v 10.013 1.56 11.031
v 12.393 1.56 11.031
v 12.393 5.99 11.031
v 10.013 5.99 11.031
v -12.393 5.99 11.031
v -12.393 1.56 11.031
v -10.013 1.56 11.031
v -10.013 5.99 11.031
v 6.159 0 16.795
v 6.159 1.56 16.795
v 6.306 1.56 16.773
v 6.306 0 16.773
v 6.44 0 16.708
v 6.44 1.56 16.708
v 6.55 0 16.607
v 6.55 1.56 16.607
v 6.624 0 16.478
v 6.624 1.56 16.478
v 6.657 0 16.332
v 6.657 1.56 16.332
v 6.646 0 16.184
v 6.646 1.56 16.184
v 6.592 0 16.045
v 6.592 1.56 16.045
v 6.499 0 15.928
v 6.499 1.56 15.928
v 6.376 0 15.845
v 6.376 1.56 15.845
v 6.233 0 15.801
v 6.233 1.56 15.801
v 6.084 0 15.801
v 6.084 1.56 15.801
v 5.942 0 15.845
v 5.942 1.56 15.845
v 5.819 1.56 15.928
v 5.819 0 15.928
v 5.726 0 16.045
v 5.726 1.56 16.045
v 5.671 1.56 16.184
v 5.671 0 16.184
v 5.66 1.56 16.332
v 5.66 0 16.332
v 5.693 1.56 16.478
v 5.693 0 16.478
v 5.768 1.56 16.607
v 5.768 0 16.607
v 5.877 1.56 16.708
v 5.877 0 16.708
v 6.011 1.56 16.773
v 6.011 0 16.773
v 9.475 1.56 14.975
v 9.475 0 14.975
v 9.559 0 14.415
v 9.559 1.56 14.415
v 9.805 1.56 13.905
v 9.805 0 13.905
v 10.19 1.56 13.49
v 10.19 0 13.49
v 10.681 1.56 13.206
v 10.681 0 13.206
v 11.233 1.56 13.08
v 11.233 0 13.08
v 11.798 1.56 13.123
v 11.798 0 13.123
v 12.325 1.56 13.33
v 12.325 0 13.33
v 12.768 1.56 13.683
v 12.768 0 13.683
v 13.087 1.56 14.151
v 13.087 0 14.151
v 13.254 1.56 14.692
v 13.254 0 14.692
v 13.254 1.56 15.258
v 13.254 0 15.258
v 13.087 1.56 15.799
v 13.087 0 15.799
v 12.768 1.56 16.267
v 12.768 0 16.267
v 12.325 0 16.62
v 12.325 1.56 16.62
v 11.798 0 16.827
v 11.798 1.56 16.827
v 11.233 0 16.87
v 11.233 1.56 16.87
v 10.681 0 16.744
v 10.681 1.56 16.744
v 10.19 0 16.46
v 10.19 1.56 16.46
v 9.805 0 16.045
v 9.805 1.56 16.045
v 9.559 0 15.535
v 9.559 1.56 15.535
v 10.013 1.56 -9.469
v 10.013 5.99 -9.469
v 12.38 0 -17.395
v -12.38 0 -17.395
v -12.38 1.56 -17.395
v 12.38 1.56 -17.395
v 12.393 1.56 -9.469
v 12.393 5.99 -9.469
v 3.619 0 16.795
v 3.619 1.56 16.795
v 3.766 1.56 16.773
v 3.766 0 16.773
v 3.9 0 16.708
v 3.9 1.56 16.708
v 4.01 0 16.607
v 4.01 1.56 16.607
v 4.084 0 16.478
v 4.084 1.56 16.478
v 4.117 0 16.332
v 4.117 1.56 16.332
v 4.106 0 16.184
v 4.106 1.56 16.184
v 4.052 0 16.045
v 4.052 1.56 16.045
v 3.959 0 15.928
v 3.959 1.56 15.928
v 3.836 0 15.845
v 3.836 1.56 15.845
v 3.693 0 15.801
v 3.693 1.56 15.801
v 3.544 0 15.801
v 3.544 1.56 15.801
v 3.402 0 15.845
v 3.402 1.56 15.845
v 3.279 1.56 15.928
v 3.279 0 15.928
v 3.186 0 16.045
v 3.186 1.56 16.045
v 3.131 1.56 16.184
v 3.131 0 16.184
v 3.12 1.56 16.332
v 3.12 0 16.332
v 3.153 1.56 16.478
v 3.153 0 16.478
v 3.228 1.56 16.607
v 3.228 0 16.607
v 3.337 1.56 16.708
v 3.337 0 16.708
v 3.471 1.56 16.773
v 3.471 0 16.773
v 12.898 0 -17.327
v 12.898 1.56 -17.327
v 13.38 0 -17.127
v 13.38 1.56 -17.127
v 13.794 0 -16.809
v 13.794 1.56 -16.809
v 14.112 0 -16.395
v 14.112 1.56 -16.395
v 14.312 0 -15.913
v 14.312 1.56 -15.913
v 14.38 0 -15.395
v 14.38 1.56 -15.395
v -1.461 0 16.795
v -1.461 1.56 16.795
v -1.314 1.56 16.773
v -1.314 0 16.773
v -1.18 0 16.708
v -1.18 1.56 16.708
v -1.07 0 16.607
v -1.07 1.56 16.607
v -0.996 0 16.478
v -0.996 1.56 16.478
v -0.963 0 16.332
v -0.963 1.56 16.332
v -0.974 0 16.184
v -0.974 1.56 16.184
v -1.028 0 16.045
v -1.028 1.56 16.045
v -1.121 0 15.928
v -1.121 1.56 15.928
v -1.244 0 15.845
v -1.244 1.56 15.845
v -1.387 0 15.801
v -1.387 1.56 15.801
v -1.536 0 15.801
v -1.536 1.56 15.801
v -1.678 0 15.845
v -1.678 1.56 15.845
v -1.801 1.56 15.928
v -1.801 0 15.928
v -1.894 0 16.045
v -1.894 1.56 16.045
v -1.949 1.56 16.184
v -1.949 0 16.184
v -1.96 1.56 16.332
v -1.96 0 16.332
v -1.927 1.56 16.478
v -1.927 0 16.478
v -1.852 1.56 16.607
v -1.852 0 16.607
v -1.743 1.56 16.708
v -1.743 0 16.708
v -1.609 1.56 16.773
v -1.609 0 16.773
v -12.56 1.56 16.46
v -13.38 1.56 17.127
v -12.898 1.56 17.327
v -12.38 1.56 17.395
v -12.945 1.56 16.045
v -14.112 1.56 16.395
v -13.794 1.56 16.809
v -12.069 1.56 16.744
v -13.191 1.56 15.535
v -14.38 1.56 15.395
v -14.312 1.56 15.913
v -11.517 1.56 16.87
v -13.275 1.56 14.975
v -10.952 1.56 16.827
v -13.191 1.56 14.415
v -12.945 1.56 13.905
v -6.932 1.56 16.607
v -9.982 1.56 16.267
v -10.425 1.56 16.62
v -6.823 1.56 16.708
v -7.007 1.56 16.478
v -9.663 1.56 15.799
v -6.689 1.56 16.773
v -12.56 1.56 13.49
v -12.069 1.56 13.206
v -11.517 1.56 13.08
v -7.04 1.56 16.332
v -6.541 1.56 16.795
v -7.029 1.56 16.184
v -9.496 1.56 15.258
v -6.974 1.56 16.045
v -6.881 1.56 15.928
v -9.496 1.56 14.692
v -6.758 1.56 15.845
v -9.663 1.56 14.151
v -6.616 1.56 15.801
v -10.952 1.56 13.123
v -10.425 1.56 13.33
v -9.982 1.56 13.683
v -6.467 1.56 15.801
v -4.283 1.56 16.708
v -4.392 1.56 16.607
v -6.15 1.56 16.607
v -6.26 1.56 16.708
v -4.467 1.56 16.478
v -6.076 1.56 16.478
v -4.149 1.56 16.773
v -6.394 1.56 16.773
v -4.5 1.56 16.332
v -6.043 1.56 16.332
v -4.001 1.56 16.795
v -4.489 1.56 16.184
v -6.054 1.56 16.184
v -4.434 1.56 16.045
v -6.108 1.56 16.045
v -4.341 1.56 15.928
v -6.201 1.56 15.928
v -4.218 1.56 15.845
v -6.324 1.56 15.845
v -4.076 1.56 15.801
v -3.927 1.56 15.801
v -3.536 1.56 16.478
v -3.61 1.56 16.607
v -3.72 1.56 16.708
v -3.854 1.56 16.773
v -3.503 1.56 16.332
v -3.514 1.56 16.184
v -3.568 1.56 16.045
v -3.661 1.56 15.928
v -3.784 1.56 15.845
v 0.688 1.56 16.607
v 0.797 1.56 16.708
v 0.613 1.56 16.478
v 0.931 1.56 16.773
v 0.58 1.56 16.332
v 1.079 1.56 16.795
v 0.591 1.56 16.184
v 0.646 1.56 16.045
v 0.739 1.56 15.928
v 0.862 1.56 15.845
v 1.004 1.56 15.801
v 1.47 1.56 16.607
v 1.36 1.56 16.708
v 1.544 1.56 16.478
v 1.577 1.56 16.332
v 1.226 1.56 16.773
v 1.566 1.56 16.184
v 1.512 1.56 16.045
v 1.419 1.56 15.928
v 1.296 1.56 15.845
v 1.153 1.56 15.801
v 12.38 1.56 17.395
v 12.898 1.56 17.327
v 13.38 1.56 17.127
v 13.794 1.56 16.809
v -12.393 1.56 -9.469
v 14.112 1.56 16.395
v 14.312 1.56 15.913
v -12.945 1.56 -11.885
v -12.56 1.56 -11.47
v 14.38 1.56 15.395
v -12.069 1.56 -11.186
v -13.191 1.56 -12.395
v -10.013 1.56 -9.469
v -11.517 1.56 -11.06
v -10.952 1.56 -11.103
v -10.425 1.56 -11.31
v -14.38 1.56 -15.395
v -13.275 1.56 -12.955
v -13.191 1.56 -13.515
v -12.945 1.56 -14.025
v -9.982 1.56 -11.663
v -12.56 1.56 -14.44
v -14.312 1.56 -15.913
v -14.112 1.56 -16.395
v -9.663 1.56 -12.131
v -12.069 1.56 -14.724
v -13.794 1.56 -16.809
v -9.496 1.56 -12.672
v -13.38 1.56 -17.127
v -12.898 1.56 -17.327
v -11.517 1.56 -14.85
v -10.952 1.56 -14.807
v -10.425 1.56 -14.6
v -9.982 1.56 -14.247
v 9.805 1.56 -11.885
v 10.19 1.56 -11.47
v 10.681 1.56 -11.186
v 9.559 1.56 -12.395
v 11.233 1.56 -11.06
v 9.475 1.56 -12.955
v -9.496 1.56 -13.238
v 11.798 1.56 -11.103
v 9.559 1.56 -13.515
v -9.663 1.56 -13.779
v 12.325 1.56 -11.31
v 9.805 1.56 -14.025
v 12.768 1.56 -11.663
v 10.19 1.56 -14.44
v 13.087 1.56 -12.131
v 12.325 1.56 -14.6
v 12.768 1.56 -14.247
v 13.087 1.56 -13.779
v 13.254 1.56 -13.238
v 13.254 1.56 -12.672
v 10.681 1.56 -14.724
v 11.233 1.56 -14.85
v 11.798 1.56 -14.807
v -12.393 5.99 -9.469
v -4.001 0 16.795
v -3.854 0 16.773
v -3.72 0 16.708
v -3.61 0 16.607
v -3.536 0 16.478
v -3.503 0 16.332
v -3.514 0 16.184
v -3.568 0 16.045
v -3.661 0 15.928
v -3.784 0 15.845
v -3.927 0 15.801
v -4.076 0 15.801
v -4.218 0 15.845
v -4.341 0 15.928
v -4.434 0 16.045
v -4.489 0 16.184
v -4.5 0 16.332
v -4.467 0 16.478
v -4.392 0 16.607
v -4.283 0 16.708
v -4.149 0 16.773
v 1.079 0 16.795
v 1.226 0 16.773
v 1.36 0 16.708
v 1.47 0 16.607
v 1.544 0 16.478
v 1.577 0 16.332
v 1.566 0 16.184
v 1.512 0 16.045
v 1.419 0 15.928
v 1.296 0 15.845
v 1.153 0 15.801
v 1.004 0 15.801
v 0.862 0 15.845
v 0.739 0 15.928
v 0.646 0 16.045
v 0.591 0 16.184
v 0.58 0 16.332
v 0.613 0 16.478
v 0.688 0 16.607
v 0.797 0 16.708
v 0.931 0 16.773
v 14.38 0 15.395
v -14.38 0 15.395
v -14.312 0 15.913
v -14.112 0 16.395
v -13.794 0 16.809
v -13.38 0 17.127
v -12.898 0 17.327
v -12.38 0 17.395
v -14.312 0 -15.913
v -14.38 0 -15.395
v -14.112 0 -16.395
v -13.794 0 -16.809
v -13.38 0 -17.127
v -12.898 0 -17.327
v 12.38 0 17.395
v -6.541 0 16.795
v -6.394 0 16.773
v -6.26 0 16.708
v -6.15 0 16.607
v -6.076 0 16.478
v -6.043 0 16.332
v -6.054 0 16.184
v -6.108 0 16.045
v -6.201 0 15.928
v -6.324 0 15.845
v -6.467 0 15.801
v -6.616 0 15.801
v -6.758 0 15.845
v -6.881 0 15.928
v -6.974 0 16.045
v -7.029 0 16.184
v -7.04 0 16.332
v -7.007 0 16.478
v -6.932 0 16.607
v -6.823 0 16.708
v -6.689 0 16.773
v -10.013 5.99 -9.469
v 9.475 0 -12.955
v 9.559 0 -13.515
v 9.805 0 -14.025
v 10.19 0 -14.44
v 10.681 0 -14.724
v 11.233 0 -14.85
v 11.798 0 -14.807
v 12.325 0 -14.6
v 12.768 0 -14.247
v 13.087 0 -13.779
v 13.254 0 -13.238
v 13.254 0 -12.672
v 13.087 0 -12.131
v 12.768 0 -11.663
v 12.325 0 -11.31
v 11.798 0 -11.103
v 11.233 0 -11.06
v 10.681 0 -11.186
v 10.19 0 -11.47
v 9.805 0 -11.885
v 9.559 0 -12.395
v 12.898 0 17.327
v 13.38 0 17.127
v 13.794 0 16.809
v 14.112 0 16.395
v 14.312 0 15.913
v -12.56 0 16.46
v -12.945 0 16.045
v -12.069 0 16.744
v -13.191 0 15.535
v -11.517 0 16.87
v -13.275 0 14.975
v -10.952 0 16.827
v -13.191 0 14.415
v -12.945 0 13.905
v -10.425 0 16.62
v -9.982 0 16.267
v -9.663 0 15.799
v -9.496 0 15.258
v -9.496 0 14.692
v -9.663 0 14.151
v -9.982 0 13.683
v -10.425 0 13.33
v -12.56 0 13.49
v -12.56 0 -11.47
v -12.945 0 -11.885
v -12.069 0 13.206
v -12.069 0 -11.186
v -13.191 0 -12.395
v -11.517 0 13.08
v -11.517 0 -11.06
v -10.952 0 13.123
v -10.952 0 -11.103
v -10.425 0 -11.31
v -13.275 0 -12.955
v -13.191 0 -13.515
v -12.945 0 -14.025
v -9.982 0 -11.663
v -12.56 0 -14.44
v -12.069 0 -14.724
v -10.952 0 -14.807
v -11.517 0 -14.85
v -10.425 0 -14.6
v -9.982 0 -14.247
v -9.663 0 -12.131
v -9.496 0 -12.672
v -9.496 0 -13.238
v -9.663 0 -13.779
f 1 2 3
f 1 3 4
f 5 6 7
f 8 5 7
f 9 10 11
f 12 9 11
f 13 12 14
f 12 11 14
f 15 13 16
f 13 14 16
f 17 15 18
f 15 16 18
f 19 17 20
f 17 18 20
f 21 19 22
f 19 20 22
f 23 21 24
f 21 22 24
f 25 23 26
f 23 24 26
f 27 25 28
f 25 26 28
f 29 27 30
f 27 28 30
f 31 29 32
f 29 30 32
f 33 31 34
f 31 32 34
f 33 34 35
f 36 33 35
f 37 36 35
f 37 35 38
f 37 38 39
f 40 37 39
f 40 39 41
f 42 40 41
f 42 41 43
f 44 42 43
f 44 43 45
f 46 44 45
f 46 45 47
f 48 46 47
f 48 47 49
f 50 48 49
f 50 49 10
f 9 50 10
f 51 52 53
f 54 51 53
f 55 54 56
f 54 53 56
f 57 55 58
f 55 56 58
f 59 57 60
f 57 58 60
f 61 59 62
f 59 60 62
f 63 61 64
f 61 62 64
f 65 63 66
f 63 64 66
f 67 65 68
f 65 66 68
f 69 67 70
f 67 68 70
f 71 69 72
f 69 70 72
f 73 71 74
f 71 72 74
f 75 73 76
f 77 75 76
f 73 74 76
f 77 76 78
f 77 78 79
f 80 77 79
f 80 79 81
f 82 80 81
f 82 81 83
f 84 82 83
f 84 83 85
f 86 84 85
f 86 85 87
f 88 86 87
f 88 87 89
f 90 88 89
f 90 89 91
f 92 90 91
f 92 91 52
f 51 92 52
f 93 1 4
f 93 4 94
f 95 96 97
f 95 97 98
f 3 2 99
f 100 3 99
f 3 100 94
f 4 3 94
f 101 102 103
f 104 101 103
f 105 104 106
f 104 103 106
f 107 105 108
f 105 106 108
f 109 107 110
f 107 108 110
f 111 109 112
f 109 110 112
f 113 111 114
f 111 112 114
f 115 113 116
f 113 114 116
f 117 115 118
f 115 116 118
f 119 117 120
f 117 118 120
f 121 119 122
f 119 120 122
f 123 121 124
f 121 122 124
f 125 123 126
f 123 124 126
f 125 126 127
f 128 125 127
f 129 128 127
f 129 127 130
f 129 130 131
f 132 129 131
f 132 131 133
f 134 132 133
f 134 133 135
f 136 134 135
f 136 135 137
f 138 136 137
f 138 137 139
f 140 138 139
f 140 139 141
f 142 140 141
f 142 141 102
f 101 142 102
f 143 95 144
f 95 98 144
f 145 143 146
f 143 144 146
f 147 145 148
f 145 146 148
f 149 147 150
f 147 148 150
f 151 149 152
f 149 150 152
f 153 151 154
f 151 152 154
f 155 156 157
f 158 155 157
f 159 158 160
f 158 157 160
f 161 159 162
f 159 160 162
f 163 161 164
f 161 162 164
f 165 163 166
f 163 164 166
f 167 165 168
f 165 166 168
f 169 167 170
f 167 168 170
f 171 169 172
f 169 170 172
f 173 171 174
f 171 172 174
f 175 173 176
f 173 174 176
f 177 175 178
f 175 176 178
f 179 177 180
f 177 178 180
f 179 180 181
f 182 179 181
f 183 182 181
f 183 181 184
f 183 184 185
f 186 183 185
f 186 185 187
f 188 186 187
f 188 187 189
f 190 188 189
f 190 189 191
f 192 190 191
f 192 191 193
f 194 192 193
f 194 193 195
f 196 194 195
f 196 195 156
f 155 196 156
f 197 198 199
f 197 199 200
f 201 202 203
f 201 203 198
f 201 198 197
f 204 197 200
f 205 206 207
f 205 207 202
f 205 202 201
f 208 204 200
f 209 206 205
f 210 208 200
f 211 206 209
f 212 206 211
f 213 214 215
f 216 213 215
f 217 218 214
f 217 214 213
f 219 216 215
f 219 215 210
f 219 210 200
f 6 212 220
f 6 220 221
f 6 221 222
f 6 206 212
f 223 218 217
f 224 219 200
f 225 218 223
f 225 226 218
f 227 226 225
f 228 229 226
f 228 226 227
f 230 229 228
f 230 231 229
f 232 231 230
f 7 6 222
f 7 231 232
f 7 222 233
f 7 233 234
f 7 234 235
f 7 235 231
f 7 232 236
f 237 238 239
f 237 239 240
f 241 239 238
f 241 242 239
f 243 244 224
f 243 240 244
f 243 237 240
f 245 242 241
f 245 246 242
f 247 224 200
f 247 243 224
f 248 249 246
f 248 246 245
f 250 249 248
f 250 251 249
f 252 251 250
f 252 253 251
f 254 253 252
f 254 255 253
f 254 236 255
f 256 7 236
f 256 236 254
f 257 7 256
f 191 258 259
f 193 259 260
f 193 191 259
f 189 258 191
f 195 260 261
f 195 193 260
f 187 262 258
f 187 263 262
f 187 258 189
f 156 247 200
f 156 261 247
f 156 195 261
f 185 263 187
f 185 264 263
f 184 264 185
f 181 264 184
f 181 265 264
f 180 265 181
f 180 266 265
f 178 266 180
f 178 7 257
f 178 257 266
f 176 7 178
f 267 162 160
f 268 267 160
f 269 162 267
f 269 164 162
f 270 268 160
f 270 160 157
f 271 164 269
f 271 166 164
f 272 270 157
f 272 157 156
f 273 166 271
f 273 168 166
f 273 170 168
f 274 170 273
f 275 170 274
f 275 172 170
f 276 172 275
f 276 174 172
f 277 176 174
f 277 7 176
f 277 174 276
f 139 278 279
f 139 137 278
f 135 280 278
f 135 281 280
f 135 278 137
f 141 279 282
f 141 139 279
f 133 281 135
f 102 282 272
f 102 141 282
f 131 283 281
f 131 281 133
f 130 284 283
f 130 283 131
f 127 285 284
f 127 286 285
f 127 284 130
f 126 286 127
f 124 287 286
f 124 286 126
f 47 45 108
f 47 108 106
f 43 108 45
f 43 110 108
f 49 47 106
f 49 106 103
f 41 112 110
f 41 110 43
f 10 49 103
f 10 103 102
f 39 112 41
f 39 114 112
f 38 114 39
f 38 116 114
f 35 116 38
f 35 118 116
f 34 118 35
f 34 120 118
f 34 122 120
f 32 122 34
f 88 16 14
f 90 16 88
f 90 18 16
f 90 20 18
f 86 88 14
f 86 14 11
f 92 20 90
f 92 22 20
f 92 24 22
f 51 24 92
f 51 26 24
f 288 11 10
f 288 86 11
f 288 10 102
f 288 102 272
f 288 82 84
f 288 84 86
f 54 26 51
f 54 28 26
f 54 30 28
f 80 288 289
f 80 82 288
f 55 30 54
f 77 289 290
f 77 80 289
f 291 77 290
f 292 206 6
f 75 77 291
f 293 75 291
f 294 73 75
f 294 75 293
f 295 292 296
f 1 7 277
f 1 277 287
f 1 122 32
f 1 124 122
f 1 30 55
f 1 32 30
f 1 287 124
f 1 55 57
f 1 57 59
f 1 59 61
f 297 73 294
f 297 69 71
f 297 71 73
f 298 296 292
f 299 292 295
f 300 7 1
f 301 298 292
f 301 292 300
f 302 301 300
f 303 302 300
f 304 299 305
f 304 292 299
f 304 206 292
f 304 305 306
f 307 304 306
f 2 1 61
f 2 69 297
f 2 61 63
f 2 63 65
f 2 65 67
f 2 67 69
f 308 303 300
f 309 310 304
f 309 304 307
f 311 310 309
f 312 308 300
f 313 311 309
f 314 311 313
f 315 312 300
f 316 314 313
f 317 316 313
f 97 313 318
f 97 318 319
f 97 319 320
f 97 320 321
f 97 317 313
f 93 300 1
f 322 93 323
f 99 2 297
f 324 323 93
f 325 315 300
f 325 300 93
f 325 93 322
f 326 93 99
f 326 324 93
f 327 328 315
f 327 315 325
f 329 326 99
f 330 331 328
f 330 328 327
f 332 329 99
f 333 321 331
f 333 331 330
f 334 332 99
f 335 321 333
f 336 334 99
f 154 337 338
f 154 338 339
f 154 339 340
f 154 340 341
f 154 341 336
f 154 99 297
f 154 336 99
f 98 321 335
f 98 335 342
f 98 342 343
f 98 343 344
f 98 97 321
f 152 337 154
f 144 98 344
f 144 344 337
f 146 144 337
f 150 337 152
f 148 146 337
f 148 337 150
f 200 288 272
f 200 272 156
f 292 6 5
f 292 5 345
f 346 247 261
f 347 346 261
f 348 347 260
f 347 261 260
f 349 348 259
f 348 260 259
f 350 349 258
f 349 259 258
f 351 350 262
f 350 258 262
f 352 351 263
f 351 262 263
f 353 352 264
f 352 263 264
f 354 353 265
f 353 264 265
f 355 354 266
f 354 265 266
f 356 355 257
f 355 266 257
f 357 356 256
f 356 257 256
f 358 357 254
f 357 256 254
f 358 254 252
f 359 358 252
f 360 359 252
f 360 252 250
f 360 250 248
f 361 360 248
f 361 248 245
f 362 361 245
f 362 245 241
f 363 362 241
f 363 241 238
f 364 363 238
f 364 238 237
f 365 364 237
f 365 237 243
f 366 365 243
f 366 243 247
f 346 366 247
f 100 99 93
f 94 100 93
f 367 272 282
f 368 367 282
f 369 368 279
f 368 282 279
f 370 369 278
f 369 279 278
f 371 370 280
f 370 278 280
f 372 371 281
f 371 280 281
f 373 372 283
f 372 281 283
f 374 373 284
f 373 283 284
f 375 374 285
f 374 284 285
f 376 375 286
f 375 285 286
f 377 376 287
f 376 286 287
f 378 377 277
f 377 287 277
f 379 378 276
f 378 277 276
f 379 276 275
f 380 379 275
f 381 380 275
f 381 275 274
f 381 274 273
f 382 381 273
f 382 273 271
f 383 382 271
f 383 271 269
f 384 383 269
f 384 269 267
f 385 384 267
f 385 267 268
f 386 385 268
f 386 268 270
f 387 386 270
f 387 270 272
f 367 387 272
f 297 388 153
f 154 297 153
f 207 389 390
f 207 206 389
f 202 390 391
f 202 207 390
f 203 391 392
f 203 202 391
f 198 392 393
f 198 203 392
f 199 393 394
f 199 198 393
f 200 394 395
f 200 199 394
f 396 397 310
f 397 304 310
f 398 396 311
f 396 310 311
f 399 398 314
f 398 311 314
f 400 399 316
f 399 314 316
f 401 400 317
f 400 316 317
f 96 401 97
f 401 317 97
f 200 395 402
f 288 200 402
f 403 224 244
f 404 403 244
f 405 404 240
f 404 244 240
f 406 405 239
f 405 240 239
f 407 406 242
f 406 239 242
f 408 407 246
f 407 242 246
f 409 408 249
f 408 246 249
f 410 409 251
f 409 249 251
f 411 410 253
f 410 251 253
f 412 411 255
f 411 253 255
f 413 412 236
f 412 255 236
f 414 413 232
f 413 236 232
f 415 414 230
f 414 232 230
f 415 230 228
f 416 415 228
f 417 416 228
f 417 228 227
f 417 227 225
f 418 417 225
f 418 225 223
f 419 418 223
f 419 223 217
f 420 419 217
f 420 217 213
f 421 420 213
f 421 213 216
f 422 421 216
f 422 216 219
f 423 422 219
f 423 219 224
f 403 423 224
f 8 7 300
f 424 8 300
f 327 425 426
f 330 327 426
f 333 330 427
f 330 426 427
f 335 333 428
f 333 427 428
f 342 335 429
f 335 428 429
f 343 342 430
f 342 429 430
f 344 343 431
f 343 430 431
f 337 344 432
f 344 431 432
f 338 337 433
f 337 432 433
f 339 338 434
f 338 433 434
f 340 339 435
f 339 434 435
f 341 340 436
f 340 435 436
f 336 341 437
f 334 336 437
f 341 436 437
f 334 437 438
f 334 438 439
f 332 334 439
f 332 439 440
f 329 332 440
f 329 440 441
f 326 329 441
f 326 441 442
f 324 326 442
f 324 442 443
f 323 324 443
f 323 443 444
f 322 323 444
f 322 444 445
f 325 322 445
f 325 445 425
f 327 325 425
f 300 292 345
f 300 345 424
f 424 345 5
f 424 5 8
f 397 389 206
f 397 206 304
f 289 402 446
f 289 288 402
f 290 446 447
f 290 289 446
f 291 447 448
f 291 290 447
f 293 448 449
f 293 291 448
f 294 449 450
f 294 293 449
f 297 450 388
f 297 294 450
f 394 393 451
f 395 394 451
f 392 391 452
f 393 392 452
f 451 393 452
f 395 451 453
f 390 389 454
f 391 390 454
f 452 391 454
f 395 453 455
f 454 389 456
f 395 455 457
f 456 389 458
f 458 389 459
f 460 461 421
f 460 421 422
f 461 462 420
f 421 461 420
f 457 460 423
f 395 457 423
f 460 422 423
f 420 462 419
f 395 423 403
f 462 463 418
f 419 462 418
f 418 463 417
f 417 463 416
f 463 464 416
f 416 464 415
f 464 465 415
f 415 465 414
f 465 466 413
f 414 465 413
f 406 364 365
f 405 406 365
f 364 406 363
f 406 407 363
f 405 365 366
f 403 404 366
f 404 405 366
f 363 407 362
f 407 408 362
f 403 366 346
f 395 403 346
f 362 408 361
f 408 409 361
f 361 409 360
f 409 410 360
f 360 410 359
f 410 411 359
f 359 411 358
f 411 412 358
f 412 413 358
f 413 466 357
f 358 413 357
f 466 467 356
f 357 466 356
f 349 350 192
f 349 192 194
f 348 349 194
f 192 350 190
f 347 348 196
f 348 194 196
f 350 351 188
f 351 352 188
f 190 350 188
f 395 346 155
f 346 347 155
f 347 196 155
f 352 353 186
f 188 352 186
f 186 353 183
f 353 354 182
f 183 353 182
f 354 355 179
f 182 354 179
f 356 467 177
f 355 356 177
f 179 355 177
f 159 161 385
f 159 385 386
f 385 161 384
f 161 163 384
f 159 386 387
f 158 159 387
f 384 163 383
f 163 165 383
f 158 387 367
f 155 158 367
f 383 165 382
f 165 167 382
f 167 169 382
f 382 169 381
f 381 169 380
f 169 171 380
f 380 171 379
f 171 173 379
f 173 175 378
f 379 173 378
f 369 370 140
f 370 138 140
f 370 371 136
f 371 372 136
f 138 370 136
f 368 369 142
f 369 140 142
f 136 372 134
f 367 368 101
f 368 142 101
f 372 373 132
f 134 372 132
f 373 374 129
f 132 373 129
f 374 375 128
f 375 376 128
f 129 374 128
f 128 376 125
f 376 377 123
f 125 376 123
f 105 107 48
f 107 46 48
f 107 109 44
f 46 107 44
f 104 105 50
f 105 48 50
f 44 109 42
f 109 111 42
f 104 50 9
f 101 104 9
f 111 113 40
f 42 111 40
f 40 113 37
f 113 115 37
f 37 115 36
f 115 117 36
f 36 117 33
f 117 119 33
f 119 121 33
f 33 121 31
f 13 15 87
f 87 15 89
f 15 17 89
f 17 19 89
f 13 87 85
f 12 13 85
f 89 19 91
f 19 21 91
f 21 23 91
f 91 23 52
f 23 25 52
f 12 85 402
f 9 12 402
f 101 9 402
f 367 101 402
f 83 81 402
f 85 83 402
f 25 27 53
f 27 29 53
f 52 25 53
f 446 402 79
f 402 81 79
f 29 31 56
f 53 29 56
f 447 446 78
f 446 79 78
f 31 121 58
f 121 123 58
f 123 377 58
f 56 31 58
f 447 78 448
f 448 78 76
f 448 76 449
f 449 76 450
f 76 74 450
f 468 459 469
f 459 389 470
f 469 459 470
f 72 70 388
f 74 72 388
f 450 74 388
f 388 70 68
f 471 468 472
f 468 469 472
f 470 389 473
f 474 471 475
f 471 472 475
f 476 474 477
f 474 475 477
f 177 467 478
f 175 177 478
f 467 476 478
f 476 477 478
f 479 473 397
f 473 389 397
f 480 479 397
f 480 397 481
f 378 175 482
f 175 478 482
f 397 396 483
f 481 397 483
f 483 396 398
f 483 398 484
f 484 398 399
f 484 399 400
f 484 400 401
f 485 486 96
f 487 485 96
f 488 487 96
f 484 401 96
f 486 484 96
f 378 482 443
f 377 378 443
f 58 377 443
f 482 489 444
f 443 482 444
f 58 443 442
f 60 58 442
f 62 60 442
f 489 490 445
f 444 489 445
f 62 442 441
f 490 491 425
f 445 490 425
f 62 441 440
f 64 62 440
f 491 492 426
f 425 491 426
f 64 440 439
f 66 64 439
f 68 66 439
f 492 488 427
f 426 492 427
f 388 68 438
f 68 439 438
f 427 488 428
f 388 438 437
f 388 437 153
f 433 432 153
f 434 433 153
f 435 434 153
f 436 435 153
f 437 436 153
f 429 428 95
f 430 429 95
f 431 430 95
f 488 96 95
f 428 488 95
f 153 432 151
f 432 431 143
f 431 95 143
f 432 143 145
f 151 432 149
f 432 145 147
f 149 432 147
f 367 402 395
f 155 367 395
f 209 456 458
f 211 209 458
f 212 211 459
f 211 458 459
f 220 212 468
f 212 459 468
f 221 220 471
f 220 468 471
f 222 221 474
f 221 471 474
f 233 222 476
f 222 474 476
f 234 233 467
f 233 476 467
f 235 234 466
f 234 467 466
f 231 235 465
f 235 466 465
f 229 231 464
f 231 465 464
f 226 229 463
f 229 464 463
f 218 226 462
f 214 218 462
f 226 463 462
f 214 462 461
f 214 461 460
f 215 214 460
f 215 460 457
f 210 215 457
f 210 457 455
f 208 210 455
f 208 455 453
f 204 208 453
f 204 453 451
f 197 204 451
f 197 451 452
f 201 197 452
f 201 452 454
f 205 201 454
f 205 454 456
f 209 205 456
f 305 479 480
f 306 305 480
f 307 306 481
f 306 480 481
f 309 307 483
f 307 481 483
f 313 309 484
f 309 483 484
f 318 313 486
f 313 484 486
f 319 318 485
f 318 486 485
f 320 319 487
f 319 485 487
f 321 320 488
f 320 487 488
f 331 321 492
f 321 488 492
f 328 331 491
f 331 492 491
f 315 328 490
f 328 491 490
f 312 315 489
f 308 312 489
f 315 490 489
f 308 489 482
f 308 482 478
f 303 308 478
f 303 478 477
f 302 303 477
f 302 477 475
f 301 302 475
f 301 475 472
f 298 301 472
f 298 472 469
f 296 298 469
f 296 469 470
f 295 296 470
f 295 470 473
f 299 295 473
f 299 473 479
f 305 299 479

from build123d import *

# Parameters (mm, degrees)
SKETCH1_W                  = 28.76
SKETCH1_H                  = 34.79
PCB_DEPTH                  = 1.56
F_3_8_3_8_DIAMETER_HOLE4_D = 3.8
SKETCH7_W                  = 2.38
SKETCH7_H                  = 20.5
HEADERS_DEPTH              = 4.43
SKETCH8_R                  = 0.5
CUT_EXTRUDE1_DEPTH         = 23.999898369
FILLET1_R                  = 2


with BuildPart() as part:
    # Sketch1 → PCB (new body)
    with BuildSketch(Plane(origin=(0, 0, 0), x_dir=(1, 0, 0), z_dir=(0, 1, 0))):
        Rectangle(SKETCH1_W, SKETCH1_H)
    extrude(amount=PCB_DEPTH)

    # Ø3.8 (3.8) Diameter Hole4 (through all)
    with Locations(Plane(origin=(0, 1.56, 0), x_dir=(1, 0, 0), z_dir=(0, 1, 0))):
        with Locations((-11.375, 12.955), (11.375, 12.955), (-11.375, -14.975), (11.375, -14.975)):
            Hole(F_3_8_3_8_DIAMETER_HOLE4_D / 2)

    # Sketch7 → Headers (add)
    with BuildSketch(Plane(origin=(0, 1.56, 0), x_dir=(1, 0, 0), z_dir=(0, 1, 0))):
        with Locations((-11.203491178, -0.781399088)):
            Rectangle(SKETCH7_W, SKETCH7_H)
    headers = extrude(amount=HEADERS_DEPTH)

    # Sketch8 → Cut-Extrude1 (cut, through all)
    with BuildSketch(Plane(origin=(0, 1.56, 0), x_dir=(1, 0, 0), z_dir=(0, 1, 0))):
        with Locations(Location((-6.541275499, -16.295, 0), (0, 0, 270))):
            Circle(SKETCH8_R)
        with Locations(Location((-4.001275499, -16.295, 0), (0, 0, 270))):
            Circle(SKETCH8_R)
        with Locations(Location((-1.461275499, -16.295, 0), (0, 0, 270))):
            Circle(SKETCH8_R)
        with Locations(Location((1.078724501, -16.295, 0), (0, 0, 270))):
            Circle(SKETCH8_R)
        with Locations(Location((3.618724501, -16.295, 0), (0, 0, 270))):
            Circle(SKETCH8_R)
        with Locations(Location((6.158724501, -16.295, 0), (0, 0, 270))):
            Circle(SKETCH8_R)
    extrude(amount=-CUT_EXTRUDE1_DEPTH, mode=Mode.SUBTRACT)

    # Mirror1: Headers across plane
    add(headers.mirror(Plane(origin=(0, 0, 0), x_dir=(0, 0, 1), z_dir=(1, 0, 0))))

    # Fillet1
    fillet1_edges = [part.edges().sort_by_distance(p)[0] for p in [
        (14.38, 0.78, 17.395),
        (-14.38, 0.78, 17.395),
        (-14.38, 0.78, -17.395),
        (14.38, 0.78, -17.395),
    ]]
    fillet(fillet1_edges, radius=FILLET1_R)


solid = part.part
